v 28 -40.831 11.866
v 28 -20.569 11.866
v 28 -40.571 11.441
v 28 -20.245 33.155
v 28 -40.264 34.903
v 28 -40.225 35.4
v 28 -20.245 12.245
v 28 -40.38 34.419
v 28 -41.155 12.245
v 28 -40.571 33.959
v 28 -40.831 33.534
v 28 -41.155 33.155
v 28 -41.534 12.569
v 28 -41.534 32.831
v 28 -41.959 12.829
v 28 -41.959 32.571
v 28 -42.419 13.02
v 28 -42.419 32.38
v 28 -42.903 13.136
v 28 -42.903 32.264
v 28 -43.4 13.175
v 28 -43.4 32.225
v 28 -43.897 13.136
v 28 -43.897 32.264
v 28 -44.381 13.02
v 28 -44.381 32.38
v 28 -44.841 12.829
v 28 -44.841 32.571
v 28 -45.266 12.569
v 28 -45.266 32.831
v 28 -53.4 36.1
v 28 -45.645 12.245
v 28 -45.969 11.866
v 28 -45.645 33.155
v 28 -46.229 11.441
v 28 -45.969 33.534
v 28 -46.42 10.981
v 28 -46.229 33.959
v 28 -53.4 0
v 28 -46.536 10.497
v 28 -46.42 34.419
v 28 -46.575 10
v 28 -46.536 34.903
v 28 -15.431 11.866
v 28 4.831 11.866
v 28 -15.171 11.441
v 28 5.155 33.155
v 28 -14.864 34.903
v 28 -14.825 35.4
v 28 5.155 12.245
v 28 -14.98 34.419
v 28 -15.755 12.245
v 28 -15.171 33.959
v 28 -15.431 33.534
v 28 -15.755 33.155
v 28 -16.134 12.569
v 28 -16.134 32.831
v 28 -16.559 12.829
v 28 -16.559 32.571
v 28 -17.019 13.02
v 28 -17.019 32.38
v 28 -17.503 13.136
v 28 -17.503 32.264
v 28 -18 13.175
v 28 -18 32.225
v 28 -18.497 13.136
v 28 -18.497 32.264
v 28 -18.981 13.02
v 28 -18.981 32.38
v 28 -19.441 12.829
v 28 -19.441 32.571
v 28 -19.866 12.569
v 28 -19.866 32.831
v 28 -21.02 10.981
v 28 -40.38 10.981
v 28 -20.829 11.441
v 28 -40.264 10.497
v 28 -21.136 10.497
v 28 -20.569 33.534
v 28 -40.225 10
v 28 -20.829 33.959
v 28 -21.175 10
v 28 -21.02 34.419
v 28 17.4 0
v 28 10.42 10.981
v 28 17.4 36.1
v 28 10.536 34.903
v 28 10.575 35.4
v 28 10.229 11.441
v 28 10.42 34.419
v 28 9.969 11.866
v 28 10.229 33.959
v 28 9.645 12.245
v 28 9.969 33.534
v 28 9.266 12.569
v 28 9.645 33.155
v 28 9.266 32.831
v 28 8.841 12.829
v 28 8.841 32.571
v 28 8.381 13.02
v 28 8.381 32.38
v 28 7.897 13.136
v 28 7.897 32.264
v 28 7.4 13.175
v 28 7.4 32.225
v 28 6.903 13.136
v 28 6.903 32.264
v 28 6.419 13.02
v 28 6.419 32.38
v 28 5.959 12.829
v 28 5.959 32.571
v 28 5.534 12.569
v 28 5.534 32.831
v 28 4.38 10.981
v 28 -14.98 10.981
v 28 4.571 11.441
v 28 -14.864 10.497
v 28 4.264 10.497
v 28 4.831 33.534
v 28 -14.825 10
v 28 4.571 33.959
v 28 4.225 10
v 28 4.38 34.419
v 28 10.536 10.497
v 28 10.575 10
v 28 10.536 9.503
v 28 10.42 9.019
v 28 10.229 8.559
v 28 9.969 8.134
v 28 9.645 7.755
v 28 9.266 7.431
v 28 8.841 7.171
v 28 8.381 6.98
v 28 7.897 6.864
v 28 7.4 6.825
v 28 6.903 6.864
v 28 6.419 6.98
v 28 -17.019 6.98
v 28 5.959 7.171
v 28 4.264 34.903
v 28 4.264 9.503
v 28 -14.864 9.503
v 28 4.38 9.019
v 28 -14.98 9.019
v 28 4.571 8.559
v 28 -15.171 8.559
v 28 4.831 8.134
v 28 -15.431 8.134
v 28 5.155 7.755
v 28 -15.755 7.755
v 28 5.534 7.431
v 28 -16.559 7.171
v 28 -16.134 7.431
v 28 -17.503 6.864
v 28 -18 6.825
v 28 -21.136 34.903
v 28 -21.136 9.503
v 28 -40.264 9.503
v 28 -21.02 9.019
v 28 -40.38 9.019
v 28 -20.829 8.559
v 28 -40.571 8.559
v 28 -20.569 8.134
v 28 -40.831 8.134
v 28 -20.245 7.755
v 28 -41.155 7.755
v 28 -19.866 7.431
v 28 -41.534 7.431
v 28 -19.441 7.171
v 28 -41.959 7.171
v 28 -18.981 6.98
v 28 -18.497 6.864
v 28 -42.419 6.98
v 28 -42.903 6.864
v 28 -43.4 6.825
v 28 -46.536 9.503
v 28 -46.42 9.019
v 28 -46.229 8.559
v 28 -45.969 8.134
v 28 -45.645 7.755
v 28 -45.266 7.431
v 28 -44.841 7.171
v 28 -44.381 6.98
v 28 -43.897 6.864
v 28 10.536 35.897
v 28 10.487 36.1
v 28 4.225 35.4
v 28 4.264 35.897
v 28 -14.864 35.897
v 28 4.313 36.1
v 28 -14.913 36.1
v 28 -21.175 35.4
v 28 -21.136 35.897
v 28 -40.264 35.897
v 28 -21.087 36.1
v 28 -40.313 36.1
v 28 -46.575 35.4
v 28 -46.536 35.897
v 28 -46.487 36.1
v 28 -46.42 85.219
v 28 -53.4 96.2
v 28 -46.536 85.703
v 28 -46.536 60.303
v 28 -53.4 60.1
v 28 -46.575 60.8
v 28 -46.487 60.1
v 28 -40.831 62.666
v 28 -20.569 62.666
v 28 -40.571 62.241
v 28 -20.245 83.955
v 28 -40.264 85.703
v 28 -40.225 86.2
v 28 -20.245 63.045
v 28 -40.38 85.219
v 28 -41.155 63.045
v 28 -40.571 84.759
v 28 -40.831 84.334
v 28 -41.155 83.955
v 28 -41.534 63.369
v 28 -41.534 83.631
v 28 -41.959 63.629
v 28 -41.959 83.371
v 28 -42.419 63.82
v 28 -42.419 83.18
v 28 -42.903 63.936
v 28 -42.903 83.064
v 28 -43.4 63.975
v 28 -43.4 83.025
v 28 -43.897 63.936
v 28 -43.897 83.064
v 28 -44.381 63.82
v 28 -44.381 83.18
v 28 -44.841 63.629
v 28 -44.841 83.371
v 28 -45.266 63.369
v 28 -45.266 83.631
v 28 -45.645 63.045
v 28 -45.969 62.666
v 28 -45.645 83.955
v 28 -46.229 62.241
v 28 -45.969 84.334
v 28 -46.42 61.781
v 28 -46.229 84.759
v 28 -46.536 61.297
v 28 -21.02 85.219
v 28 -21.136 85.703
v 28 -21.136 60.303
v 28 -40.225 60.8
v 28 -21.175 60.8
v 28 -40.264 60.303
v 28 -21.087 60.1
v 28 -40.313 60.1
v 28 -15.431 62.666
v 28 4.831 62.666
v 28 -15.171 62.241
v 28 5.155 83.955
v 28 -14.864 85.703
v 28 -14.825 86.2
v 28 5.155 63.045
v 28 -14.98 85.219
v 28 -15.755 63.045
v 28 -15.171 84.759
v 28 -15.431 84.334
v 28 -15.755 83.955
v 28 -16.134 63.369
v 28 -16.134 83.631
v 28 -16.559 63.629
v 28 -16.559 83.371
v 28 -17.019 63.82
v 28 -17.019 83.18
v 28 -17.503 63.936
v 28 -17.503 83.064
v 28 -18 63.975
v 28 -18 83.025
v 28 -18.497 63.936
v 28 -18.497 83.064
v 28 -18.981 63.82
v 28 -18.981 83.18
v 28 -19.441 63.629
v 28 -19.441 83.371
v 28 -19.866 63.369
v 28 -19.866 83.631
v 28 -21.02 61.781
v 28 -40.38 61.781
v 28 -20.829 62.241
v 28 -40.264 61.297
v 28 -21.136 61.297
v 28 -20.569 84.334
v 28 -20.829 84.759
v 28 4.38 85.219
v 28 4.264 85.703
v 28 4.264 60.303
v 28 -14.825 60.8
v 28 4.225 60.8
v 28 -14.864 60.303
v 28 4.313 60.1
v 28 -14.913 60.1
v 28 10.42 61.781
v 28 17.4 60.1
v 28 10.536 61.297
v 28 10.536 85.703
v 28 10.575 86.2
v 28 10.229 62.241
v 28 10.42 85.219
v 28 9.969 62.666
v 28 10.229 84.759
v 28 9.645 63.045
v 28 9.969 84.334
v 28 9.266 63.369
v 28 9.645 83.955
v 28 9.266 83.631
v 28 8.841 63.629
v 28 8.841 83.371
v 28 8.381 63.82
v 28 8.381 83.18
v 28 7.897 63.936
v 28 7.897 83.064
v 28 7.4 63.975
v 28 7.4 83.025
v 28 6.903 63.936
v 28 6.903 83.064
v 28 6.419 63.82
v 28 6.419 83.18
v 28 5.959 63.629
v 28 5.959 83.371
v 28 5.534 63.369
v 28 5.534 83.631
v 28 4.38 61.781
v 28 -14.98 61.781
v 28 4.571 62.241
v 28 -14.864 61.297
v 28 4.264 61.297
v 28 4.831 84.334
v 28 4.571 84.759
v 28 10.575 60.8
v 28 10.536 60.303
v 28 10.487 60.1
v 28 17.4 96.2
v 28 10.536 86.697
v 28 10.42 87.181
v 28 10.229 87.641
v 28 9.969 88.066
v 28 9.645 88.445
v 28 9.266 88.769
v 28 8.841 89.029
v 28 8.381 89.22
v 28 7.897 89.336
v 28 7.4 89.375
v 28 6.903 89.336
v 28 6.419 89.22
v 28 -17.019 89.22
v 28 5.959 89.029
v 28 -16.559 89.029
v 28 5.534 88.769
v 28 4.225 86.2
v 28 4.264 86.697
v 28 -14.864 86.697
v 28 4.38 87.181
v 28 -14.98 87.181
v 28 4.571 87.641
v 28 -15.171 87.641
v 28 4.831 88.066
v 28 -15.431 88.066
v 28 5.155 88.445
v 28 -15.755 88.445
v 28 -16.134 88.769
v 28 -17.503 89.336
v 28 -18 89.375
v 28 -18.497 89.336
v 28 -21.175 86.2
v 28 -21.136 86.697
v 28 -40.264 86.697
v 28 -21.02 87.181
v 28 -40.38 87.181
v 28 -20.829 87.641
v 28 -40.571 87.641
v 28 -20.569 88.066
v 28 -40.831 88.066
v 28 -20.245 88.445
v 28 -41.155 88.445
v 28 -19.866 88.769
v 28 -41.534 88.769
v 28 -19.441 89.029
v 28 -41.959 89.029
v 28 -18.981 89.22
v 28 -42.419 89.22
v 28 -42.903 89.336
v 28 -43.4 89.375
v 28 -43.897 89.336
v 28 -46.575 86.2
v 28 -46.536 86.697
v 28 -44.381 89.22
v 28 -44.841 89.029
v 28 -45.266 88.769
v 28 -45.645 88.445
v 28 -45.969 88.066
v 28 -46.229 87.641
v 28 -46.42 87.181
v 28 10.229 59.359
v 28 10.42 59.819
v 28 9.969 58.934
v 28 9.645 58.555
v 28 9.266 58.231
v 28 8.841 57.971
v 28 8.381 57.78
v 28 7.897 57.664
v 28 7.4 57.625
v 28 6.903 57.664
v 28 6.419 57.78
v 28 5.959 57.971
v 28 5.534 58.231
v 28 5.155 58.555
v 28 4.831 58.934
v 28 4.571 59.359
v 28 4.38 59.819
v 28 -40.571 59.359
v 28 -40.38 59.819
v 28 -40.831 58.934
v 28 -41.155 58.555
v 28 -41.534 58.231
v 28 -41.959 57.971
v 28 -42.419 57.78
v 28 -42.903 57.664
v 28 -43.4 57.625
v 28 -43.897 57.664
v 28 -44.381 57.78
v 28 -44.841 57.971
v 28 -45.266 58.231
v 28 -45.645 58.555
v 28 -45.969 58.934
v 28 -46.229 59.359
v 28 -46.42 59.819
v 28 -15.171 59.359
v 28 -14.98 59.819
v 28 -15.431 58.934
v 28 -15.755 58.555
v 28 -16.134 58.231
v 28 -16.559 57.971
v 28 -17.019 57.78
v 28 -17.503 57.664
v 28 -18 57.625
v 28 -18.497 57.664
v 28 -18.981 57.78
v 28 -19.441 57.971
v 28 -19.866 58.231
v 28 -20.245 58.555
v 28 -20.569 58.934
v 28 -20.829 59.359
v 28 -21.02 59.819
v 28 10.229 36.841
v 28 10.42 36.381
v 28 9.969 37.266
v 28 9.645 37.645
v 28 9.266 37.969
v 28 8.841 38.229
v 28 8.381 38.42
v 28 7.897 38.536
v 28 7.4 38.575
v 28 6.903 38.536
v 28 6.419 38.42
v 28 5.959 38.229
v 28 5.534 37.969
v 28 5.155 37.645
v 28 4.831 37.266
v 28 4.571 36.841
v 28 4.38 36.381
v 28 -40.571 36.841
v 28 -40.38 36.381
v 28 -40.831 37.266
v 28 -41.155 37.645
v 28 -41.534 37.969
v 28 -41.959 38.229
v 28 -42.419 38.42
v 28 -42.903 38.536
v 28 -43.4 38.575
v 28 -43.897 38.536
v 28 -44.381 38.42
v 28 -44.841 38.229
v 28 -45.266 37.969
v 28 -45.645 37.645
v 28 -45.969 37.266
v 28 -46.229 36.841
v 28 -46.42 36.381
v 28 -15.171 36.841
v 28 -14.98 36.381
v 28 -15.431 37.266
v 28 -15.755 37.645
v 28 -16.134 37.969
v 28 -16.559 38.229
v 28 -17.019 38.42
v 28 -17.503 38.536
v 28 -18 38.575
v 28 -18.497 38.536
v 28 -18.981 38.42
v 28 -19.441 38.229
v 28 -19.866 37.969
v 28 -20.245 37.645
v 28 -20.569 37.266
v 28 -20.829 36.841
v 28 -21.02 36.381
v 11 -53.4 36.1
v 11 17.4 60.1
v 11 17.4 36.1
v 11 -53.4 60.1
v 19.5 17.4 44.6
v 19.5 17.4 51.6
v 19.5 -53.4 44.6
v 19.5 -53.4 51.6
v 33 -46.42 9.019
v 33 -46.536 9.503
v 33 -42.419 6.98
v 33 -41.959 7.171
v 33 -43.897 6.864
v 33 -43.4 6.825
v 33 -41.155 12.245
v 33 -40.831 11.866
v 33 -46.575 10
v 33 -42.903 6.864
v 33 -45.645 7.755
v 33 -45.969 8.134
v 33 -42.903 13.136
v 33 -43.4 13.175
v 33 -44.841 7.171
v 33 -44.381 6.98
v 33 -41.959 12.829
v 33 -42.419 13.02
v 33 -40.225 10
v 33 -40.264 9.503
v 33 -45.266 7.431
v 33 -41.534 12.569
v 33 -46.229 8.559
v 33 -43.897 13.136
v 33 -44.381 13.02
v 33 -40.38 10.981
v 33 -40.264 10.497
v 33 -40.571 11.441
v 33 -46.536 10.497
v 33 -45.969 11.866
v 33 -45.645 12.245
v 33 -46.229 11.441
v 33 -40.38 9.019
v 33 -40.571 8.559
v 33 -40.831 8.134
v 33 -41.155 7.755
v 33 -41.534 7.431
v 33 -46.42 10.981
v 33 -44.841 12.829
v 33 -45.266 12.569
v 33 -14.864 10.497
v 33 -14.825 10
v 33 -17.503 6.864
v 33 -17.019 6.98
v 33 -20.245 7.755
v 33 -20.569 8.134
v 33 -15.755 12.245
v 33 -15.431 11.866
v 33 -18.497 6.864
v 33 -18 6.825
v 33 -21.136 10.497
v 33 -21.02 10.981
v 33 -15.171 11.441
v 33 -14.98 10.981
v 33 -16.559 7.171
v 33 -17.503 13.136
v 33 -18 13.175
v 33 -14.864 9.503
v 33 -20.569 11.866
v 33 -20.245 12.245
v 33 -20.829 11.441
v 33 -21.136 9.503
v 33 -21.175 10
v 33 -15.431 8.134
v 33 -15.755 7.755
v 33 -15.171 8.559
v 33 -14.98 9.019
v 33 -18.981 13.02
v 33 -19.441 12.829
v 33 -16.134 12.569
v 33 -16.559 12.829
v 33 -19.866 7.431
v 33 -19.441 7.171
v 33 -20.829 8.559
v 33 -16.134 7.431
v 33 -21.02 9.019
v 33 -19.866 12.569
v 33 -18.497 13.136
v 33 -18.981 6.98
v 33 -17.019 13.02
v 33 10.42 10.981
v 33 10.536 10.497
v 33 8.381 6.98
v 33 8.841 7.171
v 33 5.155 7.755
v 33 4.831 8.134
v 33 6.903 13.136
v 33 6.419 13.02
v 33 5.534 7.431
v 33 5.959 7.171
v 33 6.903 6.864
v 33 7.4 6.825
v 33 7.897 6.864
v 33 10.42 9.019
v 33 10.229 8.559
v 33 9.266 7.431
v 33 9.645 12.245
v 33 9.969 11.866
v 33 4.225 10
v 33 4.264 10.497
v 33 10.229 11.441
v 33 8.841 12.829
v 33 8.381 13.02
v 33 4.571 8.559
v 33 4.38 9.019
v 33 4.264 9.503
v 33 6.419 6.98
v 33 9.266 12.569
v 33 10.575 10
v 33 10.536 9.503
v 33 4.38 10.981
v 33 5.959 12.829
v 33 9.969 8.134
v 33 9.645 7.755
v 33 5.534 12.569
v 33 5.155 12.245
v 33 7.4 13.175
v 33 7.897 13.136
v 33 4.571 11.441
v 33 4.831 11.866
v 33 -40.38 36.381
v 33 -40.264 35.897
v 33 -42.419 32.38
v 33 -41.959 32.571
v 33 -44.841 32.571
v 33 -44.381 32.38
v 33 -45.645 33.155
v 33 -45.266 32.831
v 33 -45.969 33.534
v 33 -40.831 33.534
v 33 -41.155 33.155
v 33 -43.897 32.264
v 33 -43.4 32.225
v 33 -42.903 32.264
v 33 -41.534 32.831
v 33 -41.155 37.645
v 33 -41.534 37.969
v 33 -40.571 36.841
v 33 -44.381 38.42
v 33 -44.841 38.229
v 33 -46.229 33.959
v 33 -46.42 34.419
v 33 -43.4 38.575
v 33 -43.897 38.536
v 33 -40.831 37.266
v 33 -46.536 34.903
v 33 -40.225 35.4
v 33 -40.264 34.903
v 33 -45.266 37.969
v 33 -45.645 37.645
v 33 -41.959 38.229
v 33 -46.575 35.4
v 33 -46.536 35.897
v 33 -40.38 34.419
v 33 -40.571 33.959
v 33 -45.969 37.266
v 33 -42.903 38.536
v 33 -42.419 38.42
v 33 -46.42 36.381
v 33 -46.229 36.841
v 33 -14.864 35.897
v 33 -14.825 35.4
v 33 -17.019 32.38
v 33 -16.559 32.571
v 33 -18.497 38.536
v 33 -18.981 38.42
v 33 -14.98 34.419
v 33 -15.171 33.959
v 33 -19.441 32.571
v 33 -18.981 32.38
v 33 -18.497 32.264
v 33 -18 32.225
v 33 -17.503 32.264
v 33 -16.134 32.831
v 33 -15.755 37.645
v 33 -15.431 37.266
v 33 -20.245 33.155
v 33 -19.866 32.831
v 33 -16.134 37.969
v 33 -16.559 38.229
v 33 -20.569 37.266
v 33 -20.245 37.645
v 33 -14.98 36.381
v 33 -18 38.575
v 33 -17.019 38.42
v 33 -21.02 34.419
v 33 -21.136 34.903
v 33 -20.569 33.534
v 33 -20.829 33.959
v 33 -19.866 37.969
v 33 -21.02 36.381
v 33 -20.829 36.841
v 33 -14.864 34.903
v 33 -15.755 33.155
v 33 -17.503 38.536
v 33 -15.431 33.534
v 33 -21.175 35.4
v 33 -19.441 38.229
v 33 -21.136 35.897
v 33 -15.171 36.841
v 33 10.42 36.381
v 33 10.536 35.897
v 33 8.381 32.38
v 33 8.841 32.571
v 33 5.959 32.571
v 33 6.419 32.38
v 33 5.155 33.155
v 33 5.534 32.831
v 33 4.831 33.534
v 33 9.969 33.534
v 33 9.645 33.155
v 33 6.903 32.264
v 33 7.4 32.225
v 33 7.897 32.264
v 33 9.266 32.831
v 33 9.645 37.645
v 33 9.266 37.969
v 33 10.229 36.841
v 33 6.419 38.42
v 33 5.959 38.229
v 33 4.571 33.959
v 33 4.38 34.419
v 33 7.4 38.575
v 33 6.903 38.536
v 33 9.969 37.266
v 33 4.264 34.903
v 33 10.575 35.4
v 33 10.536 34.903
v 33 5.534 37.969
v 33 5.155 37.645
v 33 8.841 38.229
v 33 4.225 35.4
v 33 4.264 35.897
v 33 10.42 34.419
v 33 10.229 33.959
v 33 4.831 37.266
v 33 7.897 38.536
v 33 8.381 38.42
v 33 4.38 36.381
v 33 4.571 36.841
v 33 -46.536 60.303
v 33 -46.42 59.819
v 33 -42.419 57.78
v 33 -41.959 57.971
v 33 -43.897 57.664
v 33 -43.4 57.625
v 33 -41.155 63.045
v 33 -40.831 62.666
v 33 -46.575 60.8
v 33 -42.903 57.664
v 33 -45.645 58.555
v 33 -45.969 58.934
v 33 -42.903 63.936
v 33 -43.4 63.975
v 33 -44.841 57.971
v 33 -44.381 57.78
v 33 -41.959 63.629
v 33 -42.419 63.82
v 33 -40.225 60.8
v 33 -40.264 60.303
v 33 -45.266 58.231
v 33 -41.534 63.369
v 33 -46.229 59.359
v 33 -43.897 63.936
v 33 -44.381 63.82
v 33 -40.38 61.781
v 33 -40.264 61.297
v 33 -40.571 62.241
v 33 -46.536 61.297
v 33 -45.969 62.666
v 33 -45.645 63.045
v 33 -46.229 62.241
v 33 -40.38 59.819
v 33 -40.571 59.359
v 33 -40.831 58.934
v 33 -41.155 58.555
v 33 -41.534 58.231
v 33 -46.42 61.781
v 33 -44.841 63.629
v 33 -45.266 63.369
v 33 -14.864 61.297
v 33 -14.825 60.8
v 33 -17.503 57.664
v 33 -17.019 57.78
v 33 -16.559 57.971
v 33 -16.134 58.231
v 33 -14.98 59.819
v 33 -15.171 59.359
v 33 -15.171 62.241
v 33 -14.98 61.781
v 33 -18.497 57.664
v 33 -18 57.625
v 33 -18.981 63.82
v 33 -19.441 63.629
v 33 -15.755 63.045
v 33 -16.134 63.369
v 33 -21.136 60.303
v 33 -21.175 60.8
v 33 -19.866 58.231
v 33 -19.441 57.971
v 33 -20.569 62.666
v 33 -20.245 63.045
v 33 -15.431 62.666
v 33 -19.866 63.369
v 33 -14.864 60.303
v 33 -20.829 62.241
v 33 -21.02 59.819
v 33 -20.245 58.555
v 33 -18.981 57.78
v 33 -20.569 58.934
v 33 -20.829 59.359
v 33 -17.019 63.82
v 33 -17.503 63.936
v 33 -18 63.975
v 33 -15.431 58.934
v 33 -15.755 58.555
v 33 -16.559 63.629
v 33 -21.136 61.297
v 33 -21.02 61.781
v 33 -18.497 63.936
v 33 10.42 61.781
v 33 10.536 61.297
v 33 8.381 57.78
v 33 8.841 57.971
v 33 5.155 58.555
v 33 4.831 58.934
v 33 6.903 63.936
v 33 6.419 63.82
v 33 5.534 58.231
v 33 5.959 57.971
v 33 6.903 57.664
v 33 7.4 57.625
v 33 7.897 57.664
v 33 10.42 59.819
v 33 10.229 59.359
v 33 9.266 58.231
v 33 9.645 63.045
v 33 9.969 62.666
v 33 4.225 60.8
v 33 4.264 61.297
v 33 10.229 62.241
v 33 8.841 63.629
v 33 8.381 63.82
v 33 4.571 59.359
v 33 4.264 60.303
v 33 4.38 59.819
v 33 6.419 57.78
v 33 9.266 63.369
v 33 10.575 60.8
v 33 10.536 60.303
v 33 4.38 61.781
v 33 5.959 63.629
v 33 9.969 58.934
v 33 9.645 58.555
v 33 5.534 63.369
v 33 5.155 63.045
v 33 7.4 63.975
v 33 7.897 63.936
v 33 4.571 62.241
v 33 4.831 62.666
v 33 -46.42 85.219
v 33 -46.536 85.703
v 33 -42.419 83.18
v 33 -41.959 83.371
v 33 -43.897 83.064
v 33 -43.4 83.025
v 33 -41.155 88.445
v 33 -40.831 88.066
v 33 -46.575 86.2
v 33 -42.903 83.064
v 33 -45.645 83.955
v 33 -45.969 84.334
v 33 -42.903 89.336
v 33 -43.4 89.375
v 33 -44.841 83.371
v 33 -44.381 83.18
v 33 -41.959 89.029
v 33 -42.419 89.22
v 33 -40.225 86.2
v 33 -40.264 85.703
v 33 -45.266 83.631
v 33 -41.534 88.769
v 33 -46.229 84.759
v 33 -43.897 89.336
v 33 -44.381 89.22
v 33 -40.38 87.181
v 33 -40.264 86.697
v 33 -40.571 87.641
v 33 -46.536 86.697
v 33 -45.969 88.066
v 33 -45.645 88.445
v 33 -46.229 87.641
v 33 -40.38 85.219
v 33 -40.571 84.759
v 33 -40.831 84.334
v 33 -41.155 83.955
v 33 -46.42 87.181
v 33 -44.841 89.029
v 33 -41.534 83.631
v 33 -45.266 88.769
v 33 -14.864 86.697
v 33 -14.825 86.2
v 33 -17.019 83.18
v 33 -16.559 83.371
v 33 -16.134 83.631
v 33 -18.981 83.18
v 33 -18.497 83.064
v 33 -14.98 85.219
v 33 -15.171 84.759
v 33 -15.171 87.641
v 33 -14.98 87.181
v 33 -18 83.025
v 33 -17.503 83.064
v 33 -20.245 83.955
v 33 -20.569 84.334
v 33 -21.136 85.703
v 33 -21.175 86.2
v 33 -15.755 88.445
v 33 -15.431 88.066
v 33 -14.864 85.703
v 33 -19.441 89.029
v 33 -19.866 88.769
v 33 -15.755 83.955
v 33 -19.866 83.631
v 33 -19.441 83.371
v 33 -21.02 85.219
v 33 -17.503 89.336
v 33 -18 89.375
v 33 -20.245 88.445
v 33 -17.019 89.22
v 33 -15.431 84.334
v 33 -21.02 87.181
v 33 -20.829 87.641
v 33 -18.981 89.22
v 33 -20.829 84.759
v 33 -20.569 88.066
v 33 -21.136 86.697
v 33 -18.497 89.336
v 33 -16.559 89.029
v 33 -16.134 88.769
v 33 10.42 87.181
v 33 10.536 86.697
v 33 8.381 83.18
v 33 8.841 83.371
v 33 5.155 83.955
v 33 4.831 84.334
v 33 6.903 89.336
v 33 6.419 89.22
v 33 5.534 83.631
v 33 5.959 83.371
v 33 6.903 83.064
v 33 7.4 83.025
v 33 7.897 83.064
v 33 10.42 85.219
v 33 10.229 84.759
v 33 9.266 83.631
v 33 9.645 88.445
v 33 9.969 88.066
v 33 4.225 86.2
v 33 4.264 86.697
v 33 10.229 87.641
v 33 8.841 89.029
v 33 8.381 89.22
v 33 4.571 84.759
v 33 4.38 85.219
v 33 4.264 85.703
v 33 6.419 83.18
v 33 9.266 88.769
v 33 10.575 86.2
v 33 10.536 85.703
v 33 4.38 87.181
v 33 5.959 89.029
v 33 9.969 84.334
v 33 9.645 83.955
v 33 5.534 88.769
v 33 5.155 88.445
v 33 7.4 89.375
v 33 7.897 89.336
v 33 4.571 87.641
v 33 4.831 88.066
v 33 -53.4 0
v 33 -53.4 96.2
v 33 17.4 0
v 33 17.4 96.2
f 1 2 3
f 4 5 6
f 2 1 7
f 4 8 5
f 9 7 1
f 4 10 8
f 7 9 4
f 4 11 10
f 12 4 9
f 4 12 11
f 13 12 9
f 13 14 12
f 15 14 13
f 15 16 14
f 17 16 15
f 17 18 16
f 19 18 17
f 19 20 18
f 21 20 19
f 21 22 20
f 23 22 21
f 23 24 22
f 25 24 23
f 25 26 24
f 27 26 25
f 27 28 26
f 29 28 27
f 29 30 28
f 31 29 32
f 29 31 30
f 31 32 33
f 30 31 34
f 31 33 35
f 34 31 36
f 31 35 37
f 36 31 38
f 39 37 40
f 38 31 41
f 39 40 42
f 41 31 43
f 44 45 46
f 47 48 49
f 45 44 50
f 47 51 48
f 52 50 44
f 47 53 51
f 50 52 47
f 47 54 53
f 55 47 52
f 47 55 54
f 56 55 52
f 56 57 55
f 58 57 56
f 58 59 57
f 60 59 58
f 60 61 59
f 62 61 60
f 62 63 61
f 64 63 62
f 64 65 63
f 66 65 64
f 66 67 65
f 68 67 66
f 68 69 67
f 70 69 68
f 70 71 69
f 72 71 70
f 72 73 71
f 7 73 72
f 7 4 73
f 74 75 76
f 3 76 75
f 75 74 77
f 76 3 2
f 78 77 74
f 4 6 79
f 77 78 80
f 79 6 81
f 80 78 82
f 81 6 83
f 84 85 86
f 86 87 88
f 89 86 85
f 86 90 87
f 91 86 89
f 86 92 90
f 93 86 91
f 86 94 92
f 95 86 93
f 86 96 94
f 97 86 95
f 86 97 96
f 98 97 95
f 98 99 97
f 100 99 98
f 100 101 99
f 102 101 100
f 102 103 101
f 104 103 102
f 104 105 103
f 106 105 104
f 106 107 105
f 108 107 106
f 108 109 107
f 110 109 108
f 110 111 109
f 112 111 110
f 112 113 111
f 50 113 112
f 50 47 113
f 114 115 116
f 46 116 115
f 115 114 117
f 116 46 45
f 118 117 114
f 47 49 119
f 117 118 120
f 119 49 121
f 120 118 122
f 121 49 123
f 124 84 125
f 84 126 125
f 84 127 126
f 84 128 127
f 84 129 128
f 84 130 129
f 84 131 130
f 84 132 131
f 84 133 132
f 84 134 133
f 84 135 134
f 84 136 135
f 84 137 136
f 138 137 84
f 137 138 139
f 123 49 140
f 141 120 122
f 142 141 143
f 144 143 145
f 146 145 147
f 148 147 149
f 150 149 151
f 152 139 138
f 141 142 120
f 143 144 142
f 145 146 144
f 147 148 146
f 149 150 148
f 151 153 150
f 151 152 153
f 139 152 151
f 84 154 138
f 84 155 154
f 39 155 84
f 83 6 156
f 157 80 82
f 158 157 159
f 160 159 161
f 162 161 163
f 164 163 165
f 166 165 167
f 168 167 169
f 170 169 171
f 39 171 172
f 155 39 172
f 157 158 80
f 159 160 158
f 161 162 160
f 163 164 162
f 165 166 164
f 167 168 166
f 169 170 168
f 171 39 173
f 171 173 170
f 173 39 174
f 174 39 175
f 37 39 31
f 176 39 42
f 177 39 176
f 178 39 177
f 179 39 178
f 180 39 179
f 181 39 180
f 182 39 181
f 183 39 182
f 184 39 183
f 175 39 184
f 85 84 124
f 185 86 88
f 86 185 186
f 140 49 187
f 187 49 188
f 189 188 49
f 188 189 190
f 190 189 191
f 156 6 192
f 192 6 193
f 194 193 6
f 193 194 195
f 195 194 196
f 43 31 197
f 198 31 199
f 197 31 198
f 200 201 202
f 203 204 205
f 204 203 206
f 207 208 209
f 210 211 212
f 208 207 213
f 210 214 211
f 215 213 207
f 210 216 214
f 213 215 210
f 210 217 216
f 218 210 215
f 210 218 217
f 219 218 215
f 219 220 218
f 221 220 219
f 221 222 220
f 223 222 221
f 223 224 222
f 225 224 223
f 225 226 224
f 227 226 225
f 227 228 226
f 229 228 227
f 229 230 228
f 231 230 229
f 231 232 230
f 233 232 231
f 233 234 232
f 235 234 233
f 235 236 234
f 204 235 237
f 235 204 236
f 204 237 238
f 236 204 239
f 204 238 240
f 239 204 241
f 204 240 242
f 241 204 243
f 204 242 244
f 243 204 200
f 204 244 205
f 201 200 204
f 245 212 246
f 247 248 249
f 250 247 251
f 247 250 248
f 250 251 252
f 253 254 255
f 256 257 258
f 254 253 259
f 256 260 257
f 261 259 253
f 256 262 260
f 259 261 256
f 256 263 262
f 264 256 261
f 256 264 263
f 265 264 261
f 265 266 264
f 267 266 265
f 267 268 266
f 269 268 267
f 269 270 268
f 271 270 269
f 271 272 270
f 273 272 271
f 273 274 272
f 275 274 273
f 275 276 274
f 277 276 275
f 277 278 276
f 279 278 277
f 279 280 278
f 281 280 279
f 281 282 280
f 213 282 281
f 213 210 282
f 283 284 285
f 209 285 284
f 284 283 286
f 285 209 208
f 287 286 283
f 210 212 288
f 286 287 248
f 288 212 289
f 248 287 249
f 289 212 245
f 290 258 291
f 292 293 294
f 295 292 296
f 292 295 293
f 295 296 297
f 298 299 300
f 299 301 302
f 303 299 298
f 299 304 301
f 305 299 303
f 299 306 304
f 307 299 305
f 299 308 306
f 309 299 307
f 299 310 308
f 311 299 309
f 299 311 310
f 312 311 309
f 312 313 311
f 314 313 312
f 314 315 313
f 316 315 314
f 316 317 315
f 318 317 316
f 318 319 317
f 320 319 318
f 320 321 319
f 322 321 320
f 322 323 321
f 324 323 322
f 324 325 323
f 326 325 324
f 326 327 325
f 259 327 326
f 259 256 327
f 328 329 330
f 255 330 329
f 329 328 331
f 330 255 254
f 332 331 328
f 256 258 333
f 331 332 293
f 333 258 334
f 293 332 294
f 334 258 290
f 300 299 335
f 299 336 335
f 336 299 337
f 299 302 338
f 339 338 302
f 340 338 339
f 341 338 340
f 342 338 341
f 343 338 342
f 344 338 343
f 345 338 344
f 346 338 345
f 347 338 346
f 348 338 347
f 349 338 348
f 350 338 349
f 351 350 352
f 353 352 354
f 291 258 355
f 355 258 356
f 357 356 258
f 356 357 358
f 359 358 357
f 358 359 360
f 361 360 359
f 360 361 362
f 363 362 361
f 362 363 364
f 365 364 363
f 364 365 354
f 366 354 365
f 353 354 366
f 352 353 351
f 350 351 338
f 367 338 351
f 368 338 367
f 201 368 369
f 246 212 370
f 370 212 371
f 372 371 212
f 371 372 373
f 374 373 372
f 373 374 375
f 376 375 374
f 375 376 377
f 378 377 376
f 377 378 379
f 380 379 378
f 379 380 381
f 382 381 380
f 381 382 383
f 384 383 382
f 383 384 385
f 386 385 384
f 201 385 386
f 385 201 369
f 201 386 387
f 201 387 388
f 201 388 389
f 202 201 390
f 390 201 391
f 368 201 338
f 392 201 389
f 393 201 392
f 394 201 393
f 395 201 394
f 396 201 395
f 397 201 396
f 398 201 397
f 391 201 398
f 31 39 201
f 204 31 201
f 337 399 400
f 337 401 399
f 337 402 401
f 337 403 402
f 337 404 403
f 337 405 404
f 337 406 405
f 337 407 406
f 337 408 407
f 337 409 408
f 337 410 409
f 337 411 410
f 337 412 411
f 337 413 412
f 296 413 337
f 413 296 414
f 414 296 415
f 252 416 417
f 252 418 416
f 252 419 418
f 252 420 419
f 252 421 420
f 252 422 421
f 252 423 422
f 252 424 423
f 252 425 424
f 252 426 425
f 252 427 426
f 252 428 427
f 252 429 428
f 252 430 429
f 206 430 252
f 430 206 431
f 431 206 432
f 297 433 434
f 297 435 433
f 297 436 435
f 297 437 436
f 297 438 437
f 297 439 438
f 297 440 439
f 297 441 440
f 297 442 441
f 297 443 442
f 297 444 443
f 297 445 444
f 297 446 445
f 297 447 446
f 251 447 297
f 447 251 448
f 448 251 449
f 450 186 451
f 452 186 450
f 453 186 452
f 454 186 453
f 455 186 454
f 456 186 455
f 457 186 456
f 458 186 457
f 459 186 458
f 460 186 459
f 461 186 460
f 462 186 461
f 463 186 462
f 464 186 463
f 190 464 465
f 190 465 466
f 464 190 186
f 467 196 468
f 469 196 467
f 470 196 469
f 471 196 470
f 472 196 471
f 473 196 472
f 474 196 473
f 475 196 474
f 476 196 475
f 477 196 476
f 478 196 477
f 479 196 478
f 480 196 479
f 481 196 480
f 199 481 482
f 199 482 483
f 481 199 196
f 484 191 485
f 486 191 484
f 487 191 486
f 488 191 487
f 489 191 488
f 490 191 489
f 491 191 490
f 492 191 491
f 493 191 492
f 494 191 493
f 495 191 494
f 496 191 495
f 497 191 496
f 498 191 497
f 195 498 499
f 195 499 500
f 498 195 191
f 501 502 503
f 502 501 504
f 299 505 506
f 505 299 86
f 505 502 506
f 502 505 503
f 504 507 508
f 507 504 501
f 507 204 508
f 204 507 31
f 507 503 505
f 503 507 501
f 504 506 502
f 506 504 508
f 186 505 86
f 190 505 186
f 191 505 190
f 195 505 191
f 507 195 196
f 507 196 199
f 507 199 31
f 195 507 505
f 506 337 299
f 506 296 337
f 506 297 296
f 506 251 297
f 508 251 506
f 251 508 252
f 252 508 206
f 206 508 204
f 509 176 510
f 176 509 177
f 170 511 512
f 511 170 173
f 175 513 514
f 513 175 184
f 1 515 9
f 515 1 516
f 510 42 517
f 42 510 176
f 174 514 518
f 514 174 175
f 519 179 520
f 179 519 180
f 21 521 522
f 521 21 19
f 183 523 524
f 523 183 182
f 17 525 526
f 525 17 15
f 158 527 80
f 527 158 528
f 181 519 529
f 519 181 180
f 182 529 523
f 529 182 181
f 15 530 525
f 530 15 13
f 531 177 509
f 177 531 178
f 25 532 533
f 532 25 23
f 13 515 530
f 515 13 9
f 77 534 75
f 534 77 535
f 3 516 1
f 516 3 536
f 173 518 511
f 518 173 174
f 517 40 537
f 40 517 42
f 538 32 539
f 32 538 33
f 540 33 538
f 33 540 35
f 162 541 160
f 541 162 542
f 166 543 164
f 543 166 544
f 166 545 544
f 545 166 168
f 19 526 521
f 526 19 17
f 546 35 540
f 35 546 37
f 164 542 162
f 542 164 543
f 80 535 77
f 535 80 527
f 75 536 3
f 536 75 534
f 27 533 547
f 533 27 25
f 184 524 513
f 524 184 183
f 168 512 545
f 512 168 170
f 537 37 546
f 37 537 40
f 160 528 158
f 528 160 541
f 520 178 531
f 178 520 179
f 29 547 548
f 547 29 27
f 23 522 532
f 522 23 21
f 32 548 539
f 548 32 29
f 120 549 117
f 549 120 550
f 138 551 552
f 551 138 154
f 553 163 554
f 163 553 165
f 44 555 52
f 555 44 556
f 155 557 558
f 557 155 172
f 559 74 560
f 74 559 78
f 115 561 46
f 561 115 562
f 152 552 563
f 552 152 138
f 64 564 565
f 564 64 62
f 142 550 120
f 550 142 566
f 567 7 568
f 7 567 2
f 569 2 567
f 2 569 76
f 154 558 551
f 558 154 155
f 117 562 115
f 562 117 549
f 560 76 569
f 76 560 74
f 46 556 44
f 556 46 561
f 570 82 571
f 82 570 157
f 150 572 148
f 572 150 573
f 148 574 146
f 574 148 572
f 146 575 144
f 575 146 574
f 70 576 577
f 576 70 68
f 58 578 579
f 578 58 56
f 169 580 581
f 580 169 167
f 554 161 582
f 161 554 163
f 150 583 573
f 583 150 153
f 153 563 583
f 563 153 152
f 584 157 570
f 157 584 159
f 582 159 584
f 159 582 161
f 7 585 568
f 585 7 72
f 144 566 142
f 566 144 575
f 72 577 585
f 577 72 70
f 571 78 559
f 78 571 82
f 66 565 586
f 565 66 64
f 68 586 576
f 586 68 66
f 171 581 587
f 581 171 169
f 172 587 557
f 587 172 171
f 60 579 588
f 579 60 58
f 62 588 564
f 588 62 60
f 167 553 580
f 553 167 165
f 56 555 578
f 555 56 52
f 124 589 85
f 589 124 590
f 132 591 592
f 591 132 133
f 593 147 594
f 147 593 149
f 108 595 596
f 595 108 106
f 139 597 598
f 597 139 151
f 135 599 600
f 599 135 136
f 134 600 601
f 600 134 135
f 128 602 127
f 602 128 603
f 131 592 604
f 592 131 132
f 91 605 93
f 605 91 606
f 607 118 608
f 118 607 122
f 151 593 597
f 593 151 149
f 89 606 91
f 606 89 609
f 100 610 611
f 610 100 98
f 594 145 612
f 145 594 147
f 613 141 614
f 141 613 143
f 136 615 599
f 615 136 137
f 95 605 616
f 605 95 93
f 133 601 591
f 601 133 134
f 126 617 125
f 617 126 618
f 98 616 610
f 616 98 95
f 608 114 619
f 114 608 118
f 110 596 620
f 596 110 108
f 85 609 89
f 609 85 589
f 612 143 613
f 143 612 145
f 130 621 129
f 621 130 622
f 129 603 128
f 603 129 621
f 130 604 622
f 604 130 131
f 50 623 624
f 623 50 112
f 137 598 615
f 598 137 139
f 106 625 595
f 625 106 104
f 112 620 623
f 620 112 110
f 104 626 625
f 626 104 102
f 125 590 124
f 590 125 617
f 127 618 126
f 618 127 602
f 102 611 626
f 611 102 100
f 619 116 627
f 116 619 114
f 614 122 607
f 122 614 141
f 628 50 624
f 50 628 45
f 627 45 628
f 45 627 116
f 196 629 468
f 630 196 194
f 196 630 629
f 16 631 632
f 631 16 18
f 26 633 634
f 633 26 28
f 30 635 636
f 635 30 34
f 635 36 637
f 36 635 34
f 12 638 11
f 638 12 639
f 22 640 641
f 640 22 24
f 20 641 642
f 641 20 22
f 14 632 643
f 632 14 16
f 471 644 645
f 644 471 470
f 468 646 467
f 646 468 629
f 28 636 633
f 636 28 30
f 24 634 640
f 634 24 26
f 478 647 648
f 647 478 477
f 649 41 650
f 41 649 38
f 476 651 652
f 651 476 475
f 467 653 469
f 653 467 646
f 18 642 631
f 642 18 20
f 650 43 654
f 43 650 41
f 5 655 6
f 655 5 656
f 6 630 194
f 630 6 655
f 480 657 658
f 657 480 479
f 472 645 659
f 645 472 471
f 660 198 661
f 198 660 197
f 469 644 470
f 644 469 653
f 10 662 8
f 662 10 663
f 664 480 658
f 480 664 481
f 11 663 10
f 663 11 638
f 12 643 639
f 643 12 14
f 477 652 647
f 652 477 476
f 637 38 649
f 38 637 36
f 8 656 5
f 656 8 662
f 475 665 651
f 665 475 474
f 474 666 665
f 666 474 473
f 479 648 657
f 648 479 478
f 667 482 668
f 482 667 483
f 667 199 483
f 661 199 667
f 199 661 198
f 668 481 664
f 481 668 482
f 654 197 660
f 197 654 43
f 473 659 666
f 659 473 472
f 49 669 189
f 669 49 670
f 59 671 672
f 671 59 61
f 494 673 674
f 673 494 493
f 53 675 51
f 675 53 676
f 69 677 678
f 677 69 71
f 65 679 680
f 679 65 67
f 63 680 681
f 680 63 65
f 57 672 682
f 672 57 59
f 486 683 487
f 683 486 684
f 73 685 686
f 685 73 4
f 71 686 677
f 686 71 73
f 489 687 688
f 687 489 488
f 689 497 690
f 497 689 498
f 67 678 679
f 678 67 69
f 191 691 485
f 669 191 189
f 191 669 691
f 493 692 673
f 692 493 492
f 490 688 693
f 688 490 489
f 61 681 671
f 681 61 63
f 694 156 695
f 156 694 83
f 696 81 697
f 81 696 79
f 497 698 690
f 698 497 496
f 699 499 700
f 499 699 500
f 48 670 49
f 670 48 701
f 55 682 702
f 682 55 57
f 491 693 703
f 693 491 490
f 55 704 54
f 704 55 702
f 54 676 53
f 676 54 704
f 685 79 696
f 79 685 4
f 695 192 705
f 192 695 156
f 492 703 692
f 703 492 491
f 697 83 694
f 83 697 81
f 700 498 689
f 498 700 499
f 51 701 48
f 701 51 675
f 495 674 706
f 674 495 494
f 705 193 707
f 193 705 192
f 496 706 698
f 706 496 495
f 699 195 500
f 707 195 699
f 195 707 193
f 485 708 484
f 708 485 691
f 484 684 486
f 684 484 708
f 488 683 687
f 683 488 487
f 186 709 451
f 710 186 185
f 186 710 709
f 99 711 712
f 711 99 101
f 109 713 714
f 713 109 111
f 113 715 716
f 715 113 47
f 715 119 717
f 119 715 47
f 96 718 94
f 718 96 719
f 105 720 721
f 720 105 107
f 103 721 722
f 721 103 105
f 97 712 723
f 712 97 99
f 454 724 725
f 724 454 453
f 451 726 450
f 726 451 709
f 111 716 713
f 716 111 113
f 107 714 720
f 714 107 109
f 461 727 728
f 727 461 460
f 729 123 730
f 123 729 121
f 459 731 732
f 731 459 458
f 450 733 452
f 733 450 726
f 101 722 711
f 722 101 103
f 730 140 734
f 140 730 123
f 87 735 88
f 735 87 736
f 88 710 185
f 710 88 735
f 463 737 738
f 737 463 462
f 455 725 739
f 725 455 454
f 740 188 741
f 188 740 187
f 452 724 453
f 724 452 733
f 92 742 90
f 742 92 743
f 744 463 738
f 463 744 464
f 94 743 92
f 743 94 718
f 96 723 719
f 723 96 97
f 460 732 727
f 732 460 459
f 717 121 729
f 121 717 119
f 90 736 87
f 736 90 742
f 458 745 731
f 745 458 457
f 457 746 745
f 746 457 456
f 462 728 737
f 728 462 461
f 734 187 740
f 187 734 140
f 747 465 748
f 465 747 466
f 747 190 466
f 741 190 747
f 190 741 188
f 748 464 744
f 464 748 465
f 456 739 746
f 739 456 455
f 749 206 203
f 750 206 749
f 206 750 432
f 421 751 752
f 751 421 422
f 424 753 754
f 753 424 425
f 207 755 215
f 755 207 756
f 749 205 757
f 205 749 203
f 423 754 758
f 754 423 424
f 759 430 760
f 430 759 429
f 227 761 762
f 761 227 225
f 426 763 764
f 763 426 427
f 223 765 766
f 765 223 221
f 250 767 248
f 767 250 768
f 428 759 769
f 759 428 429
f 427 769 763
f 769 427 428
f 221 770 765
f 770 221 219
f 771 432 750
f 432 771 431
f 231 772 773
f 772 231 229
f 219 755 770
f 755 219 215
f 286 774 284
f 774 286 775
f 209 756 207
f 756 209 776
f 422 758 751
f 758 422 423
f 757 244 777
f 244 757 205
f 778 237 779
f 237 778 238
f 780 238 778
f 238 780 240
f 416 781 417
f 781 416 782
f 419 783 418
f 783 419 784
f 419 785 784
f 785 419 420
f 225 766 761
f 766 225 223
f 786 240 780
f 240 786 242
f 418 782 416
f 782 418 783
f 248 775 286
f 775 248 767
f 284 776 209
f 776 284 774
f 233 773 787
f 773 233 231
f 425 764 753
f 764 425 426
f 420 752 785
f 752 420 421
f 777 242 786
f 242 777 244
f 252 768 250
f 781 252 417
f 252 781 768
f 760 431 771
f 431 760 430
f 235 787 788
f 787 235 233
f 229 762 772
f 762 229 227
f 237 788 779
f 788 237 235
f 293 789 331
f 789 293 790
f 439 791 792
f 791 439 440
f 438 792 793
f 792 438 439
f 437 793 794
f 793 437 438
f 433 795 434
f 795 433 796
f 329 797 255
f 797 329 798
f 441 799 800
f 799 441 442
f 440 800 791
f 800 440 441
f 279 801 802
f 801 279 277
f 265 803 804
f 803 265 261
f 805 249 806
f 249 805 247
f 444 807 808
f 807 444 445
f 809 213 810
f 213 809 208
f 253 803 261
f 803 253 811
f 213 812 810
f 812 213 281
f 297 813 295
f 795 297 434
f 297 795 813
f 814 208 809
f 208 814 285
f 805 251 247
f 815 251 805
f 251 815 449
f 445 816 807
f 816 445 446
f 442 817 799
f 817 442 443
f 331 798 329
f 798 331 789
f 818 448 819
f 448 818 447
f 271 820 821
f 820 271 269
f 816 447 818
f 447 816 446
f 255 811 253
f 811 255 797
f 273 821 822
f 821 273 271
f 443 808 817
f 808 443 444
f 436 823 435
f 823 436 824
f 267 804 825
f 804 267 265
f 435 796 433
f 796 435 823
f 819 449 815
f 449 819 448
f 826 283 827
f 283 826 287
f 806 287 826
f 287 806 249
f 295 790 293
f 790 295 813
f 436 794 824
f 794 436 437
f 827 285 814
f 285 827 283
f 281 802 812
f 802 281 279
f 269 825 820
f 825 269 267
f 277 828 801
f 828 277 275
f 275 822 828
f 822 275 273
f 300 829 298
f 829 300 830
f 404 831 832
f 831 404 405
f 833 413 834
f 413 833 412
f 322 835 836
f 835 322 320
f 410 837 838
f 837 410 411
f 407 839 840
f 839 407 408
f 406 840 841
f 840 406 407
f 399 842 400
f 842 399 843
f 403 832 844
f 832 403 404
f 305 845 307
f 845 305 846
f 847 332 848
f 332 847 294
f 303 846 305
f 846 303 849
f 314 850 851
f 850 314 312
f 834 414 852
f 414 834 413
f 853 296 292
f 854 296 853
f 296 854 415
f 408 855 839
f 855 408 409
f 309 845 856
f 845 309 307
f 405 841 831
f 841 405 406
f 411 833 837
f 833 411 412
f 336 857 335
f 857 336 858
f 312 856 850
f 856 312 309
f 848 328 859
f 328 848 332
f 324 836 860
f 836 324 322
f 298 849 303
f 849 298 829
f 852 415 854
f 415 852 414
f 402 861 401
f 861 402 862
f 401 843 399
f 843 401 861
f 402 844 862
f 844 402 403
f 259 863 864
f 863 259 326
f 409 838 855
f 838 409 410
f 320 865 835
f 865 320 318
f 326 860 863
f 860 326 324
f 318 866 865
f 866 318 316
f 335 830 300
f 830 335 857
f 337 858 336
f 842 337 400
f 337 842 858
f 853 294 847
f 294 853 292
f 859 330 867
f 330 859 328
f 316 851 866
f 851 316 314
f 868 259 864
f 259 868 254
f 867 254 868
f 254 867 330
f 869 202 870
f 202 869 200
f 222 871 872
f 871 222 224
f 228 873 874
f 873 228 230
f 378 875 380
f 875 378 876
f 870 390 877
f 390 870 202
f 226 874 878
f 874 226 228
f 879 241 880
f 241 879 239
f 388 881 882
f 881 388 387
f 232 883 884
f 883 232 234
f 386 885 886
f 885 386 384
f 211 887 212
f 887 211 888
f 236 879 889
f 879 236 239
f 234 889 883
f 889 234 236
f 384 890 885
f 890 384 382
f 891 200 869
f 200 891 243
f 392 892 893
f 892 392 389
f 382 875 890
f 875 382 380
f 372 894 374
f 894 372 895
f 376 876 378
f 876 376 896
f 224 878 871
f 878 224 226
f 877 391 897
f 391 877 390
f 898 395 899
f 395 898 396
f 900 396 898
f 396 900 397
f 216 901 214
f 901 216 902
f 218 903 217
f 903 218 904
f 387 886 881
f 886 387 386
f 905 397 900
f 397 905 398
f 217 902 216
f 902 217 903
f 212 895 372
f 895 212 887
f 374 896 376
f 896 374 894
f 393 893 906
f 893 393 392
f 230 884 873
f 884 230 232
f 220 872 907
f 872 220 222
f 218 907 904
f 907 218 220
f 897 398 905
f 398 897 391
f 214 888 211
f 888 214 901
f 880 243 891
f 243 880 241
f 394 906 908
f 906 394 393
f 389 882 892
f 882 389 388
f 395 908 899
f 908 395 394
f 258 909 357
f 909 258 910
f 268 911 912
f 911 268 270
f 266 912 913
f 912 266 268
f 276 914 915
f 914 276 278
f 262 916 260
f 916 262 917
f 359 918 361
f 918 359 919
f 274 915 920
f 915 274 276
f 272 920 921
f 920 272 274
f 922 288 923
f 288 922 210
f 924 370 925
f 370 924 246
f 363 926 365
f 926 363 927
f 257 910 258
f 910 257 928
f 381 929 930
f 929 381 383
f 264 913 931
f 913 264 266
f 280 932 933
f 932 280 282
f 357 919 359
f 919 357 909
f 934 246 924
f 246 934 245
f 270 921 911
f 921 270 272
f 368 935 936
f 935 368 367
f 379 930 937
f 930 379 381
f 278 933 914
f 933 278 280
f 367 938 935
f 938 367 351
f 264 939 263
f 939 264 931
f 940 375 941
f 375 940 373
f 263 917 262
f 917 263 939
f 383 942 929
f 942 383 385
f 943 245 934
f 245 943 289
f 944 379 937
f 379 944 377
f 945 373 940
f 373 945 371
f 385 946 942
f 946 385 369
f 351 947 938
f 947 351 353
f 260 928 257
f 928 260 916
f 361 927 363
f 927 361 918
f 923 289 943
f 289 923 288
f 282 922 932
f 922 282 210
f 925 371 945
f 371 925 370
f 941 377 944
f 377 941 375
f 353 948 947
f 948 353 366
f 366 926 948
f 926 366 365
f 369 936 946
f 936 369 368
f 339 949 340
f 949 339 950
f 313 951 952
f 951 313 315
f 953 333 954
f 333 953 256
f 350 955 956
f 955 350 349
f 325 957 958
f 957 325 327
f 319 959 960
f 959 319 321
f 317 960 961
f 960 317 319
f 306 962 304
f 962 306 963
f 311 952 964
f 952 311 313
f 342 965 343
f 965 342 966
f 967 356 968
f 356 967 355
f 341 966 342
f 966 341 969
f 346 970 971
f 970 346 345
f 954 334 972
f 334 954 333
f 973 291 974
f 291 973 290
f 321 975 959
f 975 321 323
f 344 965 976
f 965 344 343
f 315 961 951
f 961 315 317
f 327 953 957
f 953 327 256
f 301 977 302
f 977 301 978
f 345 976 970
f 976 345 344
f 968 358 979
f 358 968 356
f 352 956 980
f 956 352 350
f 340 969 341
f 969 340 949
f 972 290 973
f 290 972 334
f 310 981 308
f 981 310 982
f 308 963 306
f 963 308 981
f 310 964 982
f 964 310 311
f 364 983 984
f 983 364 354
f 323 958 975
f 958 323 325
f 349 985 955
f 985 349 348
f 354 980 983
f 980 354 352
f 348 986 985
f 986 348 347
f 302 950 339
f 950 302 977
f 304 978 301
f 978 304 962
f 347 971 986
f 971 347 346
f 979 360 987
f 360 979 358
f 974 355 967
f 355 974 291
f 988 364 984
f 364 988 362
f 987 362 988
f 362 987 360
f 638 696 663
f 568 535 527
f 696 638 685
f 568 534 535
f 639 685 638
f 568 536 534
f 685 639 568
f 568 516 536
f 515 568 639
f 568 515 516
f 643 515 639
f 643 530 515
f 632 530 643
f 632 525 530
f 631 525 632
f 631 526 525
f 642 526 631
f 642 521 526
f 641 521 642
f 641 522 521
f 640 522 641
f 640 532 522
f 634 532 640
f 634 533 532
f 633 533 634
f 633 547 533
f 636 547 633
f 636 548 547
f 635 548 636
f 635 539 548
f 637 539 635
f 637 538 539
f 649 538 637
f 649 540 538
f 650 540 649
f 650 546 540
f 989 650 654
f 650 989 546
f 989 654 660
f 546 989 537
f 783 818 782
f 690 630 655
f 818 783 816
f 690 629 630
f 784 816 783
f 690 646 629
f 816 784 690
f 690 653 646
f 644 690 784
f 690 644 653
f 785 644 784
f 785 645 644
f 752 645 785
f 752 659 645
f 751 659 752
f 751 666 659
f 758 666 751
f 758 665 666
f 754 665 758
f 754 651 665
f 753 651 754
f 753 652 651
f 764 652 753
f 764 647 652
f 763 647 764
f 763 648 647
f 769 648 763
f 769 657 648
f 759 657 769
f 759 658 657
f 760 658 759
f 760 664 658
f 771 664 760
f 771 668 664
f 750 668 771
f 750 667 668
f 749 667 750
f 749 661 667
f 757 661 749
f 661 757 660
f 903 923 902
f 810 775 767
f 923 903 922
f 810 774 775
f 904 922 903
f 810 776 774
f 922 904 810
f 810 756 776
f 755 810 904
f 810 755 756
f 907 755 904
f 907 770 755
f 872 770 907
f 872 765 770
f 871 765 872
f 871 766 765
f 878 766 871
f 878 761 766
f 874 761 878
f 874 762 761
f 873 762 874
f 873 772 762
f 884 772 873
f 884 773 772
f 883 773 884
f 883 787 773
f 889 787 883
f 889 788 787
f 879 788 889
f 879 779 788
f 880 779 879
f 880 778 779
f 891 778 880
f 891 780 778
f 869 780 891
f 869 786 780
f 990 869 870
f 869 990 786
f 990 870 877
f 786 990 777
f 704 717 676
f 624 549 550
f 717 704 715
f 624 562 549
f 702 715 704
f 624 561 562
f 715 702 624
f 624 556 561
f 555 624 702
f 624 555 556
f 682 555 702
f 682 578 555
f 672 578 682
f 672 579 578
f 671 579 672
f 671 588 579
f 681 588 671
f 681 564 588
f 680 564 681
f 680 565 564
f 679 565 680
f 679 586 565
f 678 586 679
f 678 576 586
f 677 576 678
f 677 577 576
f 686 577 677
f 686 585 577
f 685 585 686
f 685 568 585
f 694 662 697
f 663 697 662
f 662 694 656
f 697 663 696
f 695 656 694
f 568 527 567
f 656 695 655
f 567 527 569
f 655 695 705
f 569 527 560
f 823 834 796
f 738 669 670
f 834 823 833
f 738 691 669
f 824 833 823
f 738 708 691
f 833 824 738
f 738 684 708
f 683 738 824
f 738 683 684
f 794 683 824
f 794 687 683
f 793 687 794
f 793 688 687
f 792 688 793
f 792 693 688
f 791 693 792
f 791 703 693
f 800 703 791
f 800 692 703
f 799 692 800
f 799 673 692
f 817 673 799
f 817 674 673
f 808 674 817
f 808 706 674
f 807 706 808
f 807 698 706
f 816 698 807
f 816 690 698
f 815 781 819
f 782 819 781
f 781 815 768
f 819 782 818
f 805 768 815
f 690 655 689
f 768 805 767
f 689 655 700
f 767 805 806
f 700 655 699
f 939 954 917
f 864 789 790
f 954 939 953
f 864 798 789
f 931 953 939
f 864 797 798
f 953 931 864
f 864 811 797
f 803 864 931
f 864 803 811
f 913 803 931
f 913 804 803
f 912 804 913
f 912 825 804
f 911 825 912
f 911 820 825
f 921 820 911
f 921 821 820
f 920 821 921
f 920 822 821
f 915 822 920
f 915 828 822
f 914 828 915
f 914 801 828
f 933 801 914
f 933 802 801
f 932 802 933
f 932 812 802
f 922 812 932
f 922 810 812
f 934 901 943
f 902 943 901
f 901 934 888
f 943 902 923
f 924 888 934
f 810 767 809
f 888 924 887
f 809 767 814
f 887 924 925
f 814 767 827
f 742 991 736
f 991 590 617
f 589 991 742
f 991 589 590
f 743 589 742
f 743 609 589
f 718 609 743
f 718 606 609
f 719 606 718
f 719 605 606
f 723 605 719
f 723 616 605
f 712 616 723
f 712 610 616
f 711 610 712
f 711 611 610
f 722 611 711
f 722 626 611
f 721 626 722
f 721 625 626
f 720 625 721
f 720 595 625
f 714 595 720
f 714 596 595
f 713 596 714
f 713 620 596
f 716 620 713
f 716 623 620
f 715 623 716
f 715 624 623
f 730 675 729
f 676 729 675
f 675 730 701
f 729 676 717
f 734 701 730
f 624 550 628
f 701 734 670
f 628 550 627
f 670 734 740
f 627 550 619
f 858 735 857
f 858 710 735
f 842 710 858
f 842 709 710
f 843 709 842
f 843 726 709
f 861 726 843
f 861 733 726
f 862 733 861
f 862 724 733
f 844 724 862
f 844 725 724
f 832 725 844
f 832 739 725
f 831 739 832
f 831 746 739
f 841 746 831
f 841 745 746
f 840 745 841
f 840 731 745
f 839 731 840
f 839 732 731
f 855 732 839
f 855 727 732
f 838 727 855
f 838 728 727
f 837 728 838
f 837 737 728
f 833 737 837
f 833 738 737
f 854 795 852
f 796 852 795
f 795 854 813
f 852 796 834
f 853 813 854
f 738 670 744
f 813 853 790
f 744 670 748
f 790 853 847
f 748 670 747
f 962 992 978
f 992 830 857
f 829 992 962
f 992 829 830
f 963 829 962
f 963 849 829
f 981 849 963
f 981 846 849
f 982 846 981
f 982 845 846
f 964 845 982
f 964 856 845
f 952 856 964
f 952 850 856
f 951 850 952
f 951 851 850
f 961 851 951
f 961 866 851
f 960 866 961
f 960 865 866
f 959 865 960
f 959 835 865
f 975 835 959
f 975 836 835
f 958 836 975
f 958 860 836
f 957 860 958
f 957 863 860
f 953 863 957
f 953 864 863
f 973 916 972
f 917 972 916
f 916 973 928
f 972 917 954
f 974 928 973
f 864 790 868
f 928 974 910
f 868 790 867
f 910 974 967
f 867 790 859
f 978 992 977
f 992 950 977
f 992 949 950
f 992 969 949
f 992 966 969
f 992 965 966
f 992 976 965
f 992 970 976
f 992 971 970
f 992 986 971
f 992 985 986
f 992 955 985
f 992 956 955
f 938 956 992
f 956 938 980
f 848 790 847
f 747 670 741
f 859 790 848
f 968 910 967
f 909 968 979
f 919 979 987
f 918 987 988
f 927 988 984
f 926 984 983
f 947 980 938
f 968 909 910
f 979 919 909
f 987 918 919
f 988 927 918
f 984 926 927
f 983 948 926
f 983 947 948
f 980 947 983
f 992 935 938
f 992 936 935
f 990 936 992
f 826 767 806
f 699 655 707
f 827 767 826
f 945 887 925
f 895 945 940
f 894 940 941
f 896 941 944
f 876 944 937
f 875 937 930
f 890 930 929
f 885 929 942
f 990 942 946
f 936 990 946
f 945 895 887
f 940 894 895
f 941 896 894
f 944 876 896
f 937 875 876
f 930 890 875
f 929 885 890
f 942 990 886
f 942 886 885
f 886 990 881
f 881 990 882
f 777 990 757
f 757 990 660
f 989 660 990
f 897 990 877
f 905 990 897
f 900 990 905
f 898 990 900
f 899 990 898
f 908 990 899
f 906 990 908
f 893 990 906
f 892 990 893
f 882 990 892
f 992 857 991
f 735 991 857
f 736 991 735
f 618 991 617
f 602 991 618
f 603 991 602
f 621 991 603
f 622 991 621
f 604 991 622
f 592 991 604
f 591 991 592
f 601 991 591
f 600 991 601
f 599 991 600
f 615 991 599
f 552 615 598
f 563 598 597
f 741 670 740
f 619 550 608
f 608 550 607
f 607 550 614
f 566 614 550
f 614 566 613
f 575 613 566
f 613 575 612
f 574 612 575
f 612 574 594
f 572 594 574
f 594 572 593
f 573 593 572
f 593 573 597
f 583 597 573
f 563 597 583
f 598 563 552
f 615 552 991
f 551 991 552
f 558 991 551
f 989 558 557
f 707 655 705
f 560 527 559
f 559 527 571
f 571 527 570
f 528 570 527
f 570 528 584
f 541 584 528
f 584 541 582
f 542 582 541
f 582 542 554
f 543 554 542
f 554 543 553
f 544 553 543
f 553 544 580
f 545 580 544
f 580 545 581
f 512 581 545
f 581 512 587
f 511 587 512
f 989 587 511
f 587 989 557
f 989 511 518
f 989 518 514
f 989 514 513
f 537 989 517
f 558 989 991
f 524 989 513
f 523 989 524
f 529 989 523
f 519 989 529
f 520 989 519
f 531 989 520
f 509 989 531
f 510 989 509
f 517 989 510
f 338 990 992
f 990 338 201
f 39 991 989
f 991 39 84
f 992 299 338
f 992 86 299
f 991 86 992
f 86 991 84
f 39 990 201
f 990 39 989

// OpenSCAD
// GearTrack-to-Pegboard Adapter
// Slides into Gladiator GearTrack/GearWall channels and presents
// standard 1/4" pegboard holes for your existing hooks.
//
// Self-contained — no external STL dependencies.
// Bracket profile traced from CosmicProphet's GearTrack Mounting
// Brackets (Thingiverse thing:4075984), licensed CC BY 4.0.
//
// Print settings:
//   Orientation: flat on bed
//   Infill: 50-80%, rectilinear
//   Perimeters: 3+
//   Material: PLA or PETG (PETG recommended for garage use)
//   Supports: not required

/* [Pegboard] */

// Columns across (horizontal, along the track). Even numbers only.
width = 4; // [2, 4, 6, 8]

// Rows tall (vertical, up the wall)
height = 3; // [1:1:12]

// Hole diameter in mm (standard = 6.35 / 1/4 inch)
hole_dia = 6.35;

// Hole center-to-center spacing in mm (standard = 25.4 / 1 inch)
hole_spacing = 25.4;

/* [Plate] */

// Plate thickness in mm
plate_thick = 5.0; // [3:0.5:8]

// Margin around outermost holes in mm
plate_margin = 10.0; // [5:1:15]

/* [Standoff] */

// Space behind plate for hook backs (mm). Standard hooks need 15-20mm.
standoff = 17.0; // [12:1:25]

// Rib thickness in mm (horizontal direction)
rib_thick = 4.0; // [3:0.5:6]

// Gusset size in mm (triangular reinforcement at rib joints)
gusset = 10.0; // [6:1:15]

/* [Advanced] */

// Tab width in mm (along the track)
tab_width = 10; // [8:1:14]

// Print just one bracket tab to test GearTrack fit
test_clip = false;

/* [Hidden] */

$fn = 40;

// ----- BRACKET PROFILE -----
// 2D cross-section of the GearTrack engagement tab.
// Traced from CosmicProphet's Gearwall_Bracket_10mm.stl
// (Thingiverse thing:4075984, CC BY 4.0)
// X = depth (negative = wall, positive = room)
// Y = height (vertical)
_bracket_profile = [
    [  -9.94, -68.00],
    [ -11.00, -64.50],
    [  -6.82, -62.50],
    [  10.52, -62.00],
    [ -10.98, -57.50],
    [   2.94, -56.00],
    [  -8.01,   7.50],
    [  -5.25,  12.00],
    [  -9.00,  12.50],
    [  10.59,  19.00],
    [  -5.40,  21.00],
    [  -9.00,  26.00],
    [  -5.75,  31.50],
    [  -6.11,  32.00],
    [  -5.00,  32.00],
    [  -8.60,  26.00],
    [  -4.50,  20.50],
    [  11.00,  19.00],
    [   2.82,  12.50],
    [   3.40,  11.00],
    [  -5.14,   7.00],
    [   2.99, -57.00],
    [ -10.59, -58.00],
    [  11.00, -62.00],
    [  10.42, -63.00],
    [ -10.60, -64.50],
    [  -7.14, -68.00]
];

// ----- DERIVED -----
plate_w = (width - 1) * hole_spacing + 2 * plate_margin;
plate_h = (height - 1) * hole_spacing + 2 * plate_margin;

num_tabs = max(1, ceil(width / 4));

bracket_height = 100;  // Y span of bracket profile
bracket_y_min  = -68;
bracket_front  = 11;   // Front face X position

num_gaps = width - 1;

// Edge-to-edge tab distribution
// 1 tab → center gap; 2+ → first, last, then evenly between
function tab_gap_index(i, n, gaps) =
    (n == 1) ? floor(gaps / 2) :
    floor(i * (gaps - 1) / (n - 1));

function gap_z(gap_idx) =
    plate_margin + (gap_idx + 0.5) * hole_spacing;

// ----- MODULES -----

module bracket_tab() {
    linear_extrude(height = tab_width)
        polygon(points = _bracket_profile);
}

module pegboard_plate() {
    difference() {
        cube([plate_thick, plate_h, plate_w]);
        for (col = [0 : width - 1]) {
            for (row = [0 : height - 1]) {
                translate([-1, plate_margin + row * hole_spacing, plate_margin + col * hole_spacing])
                    rotate([0, 90, 0])
                        cylinder(h = plate_thick + 2, d = hole_dia);
            }
        }
    }
}

module rib() {
    cube([standoff, plate_h, rib_thick]);
}

// Triangular gusset wedge.
// Right-triangle cross-section in X-Z plane, extruded in Y.
// leg_x = length along rib (X direction)
// leg_z = length along surface (Z direction)
// h = height (Y direction)
module gusset_wedge(leg_x, leg_z, h) {
    // Triangle defined in X-Z, extruded along Y via polyhedron
    polyhedron(
        points = [
            [0,  0,  0],           // 0: origin corner
            [leg_x, 0, 0],         // 1: along rib
            [0,  0,  leg_z],       // 2: along surface
            [0,  h,  0],           // 3: origin top
            [leg_x, h, 0],         // 4: along rib top
            [0,  h,  leg_z]        // 5: along surface top
        ],
        faces = [
            [0, 2, 1],            // bottom triangle
            [3, 4, 5],            // top triangle
            [0, 1, 4, 3],         // rib face
            [1, 2, 5, 4],         // hypotenuse
            [0, 3, 5, 2]          // surface face
        ]
    );
}

// ----- ASSEMBLY -----

if (test_clip) {
    bracket_tab();
} else {
    plate_y_offset = bracket_y_min + (bracket_height - plate_h) / 2;

    for (i = [0 : num_tabs - 1]) {
        gi = tab_gap_index(i, num_tabs, num_gaps);
        rz = gap_z(gi);

        // Bracket tab
        translate([0, 0, rz - tab_width / 2])
            bracket_tab();

        // Vertical rib
        translate([bracket_front, plate_y_offset, rz - rib_thick / 2])
            rib();

        // Gussets: 4 wedges per rib (back-left, back-right, front-left, front-right)
        g = gusset;

        // Back-left: at bracket face, spreading in -Z direction
        translate([bracket_front, plate_y_offset, rz - rib_thick / 2])
            gusset_wedge(g, -g, plate_h);

        // Back-right: at bracket face, spreading in +Z direction
        translate([bracket_front, plate_y_offset, rz + rib_thick / 2])
            gusset_wedge(g, g, plate_h);

        // Front-left: at plate face, spreading in -Z direction
        translate([bracket_front + standoff, plate_y_offset, rz - rib_thick / 2])
            gusset_wedge(-g, -g, plate_h);

        // Front-right: at plate face, spreading in +Z direction
        translate([bracket_front + standoff, plate_y_offset, rz + rib_thick / 2])
            gusset_wedge(-g, g, plate_h);
    }

    // Pegboard plate
    translate([bracket_front + standoff, plate_y_offset, 0])
        pegboard_plate();
}
